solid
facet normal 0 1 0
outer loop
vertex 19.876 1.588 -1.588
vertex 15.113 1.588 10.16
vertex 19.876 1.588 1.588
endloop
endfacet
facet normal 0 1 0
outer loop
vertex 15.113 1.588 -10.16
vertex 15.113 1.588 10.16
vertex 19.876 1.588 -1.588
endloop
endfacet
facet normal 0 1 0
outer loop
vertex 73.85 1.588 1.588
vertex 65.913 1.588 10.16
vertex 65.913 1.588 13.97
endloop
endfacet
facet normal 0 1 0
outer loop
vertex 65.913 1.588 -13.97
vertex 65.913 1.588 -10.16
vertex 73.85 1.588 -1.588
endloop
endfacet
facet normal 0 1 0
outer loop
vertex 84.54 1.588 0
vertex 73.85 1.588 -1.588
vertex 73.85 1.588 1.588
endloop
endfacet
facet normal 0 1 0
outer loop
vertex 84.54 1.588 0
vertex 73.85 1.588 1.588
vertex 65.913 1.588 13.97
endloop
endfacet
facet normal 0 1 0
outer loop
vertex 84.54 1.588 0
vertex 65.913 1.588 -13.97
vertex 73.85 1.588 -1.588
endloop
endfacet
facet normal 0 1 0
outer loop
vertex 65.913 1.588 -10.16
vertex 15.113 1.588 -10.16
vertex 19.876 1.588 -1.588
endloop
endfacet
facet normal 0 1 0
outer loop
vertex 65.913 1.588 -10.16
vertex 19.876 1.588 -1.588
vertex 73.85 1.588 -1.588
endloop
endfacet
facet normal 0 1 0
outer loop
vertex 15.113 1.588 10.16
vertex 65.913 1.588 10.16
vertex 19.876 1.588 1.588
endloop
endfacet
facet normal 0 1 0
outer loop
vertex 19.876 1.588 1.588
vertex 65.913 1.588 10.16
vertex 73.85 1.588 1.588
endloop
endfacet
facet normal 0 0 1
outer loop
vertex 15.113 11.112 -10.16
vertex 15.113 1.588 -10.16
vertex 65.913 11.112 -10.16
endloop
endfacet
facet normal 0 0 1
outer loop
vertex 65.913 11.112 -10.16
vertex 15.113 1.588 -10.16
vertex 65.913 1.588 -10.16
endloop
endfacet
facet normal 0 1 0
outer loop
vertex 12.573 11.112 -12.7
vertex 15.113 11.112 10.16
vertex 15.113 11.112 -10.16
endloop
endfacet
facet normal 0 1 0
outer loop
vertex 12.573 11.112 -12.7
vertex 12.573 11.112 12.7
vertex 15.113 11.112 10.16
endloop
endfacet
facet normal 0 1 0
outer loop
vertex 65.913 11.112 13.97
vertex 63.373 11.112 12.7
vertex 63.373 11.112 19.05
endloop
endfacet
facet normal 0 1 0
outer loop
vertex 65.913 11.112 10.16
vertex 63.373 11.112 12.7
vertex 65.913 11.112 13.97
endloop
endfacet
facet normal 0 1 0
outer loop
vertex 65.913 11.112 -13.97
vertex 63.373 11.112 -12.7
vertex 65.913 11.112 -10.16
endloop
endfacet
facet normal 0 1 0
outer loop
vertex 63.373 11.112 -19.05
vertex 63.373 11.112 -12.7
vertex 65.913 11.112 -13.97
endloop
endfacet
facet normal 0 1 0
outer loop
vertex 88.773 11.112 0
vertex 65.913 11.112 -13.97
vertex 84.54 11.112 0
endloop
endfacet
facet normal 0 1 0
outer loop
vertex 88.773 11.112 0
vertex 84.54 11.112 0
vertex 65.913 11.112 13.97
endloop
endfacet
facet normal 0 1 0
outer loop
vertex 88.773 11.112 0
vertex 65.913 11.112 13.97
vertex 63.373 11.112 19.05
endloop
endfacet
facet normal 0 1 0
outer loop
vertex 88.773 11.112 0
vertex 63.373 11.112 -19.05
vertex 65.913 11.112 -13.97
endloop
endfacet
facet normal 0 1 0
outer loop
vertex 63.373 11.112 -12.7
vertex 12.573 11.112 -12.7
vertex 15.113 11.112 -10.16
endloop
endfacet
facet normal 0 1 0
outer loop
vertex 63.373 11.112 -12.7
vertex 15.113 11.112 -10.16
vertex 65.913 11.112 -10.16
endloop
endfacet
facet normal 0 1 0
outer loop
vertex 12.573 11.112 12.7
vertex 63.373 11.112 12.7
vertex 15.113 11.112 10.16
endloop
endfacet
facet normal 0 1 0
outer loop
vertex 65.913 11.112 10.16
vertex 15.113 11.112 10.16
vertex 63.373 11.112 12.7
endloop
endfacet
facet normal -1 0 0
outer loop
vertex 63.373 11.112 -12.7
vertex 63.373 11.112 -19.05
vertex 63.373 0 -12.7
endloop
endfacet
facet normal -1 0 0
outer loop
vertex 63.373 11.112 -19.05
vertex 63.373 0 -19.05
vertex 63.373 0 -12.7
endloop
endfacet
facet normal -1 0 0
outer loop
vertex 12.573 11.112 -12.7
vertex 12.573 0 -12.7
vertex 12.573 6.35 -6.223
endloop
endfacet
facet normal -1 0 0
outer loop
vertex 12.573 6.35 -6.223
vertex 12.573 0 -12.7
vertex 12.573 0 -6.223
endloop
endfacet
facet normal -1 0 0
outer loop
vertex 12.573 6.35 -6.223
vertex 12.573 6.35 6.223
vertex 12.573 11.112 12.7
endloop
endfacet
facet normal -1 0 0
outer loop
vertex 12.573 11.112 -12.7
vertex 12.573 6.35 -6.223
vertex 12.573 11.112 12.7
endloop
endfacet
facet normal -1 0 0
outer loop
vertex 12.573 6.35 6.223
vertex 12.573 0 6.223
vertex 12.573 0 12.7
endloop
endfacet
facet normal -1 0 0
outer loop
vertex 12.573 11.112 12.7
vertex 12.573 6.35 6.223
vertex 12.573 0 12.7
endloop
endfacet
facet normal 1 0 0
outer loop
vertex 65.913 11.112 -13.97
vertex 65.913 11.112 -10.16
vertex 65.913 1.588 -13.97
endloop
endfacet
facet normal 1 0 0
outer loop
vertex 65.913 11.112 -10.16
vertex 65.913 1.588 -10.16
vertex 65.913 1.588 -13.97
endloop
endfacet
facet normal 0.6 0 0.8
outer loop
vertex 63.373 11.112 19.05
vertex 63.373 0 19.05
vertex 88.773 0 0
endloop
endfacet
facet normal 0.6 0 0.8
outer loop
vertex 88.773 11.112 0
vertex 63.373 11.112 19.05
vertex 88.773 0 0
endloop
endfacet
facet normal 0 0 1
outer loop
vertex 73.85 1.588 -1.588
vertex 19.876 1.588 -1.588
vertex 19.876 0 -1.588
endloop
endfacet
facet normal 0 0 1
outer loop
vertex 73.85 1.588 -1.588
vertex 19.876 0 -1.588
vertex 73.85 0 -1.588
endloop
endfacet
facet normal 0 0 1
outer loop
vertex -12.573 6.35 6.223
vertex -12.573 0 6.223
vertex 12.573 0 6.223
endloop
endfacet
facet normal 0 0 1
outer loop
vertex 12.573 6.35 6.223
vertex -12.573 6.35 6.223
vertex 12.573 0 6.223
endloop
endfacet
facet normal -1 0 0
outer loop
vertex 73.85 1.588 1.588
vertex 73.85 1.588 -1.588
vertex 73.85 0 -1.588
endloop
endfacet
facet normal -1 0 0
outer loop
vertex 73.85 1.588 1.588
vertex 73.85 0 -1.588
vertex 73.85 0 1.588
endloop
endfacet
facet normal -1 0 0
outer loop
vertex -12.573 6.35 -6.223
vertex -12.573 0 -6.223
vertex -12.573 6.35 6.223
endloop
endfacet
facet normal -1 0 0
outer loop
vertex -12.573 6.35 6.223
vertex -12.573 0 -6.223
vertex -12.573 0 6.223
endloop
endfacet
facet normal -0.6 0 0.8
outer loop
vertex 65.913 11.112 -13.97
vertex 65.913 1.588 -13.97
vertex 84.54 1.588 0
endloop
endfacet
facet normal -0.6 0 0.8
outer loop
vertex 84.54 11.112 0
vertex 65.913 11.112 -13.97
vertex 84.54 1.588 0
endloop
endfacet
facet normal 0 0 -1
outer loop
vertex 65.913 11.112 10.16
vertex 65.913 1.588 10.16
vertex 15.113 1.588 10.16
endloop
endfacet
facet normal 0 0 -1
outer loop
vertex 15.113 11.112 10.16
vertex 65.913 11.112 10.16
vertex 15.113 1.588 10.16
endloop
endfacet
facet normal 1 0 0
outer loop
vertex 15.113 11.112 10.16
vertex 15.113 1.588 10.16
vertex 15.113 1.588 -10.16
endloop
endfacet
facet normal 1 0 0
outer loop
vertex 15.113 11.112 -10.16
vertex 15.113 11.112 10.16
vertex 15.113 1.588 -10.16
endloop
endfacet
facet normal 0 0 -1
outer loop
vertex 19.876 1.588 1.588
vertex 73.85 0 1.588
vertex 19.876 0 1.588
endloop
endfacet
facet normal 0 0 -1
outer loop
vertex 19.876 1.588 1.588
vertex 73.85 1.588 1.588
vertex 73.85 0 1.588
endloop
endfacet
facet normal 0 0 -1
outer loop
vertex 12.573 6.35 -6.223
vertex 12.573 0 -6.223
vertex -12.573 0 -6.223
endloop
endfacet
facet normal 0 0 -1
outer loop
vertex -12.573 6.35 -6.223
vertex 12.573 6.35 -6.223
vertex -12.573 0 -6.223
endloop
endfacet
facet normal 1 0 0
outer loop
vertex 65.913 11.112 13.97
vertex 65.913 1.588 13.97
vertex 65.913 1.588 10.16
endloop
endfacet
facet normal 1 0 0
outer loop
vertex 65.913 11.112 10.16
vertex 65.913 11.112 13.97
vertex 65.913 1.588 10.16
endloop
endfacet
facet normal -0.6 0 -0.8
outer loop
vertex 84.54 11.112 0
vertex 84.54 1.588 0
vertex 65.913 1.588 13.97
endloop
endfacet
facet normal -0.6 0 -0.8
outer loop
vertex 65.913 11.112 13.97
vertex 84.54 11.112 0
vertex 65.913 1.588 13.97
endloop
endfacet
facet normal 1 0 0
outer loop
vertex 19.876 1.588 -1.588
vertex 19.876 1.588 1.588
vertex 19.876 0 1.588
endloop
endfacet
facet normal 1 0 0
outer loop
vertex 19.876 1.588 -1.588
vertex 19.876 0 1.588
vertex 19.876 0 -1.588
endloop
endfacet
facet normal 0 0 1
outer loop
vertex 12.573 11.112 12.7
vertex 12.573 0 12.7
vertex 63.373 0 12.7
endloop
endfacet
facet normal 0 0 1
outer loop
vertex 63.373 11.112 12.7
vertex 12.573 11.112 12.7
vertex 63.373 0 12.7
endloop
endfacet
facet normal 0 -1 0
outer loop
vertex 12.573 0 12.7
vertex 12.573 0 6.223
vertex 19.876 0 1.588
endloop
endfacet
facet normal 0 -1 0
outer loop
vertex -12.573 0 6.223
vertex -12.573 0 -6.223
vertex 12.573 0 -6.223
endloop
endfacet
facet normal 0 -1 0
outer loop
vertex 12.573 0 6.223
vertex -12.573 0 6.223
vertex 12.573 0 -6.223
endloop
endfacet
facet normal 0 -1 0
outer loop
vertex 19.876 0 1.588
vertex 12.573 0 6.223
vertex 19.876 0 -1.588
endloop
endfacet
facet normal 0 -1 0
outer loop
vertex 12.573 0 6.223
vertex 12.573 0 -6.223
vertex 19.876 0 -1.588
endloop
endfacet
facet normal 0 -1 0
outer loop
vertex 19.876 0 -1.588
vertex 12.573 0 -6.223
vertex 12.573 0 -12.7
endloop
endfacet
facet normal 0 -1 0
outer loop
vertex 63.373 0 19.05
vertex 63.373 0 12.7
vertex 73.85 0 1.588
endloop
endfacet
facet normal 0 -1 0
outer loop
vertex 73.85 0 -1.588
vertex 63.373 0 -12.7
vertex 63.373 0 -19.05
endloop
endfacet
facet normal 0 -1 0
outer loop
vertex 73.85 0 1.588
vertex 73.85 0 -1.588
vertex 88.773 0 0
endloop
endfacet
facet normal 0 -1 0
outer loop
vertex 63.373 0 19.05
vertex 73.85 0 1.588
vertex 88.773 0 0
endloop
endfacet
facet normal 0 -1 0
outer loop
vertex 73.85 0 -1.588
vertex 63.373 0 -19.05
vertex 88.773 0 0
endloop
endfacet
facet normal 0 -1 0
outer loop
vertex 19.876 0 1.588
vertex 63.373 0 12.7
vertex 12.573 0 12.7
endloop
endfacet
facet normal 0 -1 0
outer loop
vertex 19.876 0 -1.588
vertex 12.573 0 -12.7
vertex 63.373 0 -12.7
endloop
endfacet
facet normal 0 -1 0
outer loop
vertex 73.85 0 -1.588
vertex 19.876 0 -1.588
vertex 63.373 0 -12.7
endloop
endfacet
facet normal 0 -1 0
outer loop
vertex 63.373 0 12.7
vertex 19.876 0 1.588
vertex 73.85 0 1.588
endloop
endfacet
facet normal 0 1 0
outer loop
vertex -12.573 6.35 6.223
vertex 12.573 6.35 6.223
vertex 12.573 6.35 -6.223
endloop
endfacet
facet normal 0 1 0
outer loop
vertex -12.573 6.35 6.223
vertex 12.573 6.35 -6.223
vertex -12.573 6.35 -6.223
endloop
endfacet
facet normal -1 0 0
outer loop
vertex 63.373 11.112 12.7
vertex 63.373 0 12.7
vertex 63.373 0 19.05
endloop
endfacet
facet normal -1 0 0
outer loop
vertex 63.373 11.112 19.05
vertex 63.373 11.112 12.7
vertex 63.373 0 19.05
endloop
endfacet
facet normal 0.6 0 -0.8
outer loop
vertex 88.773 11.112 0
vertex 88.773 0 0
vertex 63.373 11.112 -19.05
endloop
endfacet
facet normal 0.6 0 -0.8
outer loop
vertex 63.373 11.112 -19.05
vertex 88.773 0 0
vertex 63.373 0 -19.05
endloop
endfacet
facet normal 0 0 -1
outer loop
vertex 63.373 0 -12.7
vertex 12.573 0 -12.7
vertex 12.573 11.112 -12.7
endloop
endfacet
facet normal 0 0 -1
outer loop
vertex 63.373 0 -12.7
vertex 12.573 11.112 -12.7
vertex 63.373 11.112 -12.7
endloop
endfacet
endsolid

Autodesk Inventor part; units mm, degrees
ref_plane "YZ Plane" through (0, 0, 0) normal (1, 0, 0) x (0, 1, 0)
ref_plane "XZ Plane" through (0, 0, 0) normal (0, 1, 0) x (-1, 0, 0)
ref_plane "XY Plane" through (0, 0, 0) normal (0, 0, 1) x (1, 0, 0)
sketch "Sketch1" plane through (0, 0, 0) normal (0, 1, 0) x (-1, 0, 0)
  line L0 (12.573, 6.223) -> (-12.573, 6.223)
  line L1 (-12.573, 6.223) -> (-12.573, -6.223)
  line L2 (-12.573, -6.223) -> (12.573, -6.223)
  line L3 (12.573, -6.223) -> (12.573, 6.223)
  point P0 (0, 0)
  dimension "d0" = 12.446
  dimension "d1" = 25.146
  dimension "d2" = 6.223
  dimension "d3" = 12.573
extrude "Extrusion1" add sketch "Sketch1" along normal blind 6.35
sketch "Sketch2" plane through (12.573, 0, 6.223) normal (1, 0, 0) x (0, 0, -1)
  line L0 (-6.477, 0) -> (18.923, 0)
  line L1 (18.923, 0) -> (18.923, 1.5875)
  line L2 (18.923, 1.5875) -> (-6.477, 1.5875)
  line L3 (-6.477, 1.5875) -> (-6.477, 0)
  line L4 (0, 0) -> (12.446, 0) projected
  line L5 (0, 0) -> (12.446, 0) projected
  line L6 (12.446, 0) -> (12.446, 6.35) projected
  line L7 (0, 6.35) -> (12.446, 6.35) projected
  line L8 (0, 0) -> (0, 6.35) projected
  point P0 (6.223, 0)
  point P1 (6.223, 0)
  dimension "d6" = 25.4
  dimension "d7" = 12.7
  dimension "d8" = 1.5875
extrude "Extrusion2" add sketch "Sketch2" along normal blind 50.8 contours L3 L2 L8 L0 | L8 L2 L6 L0 | L6 L2 L1 L0
sketch "Sketch3" plane through (12.573, 1.5875, -6.223) normal (0, 1, 0) x (1, 0, 0)
  line L0 (0, 6.477) -> (0, 0) projected
  line L1 (0, -12.446) -> (0, 0) projected
  line L2 (0, -12.446) -> (0, -18.923) projected
  line L3 (0, -18.923) -> (50.8, -18.923) projected
  line L4 (50.8, 6.477) -> (50.8, -18.923) projected
  line L5 (0, 6.477) -> (50.8, 6.477) projected
  line L6 (50.8, -25.273) -> (50.8, 12.827)
  line L7 (50.8, 12.827) -> (76.2, -6.223)
  line L8 (76.2, -6.223) -> (50.8, -25.273)
  point P0 (-12.573, -6.223)
  point P1 (50.8, -18.923)
  dimension "d11" = 38.1
  dimension "d12" = 6.35
  dimension "d13" = 12.7
  dimension "d14" = 12.7
  dimension "d15" = 25.4
  dimension "d16" = 50.8
  dimension "d17" = 50.8
extrude "Extrusion3" add sketch "Sketch3" against normal blind 1.5875 contours L6 L7 L8 L4
sketch "Sketch4" plane through (12.573, 1.5875, -6.223) normal (0, 1, 0) x (1, 0, 0)
  line L0 (0, 6.477) -> (0, 0) projected
  line L1 (0, -12.446) -> (0, 0) projected
  line L2 (0, -12.446) -> (0, -18.923) projected
  line L3 (0, -18.923) -> (50.8, -18.923) projected
  line L4 (50.8, -18.923) -> (50.8, -25.273) projected
  line L5 (50.8, -25.273) -> (76.2, -6.223) projected
  line L6 (76.2, -6.223) -> (50.8, 12.827) projected
  line L7 (50.8, 12.827) -> (50.8, 6.477) projected
  line L8 (0, 6.477) -> (50.8, 6.477) projected
  line L9 (53.34, 3.937) -> (53.34, 7.747)
  line L10 (53.34, 7.747) -> (71.9667, -6.223)
  line L11 (71.9667, -6.223) -> (53.34, -20.193)
  line L12 (53.34, -20.193) -> (53.34, -16.383)
  line L13 (53.34, -16.383) -> (2.54, -16.383)
  line L14 (2.54, -16.383) -> (2.54, -12.446)
  line L15 (2.54, -12.446) -> (2.54, 0)
  line L16 (2.54, 0) -> (2.54, 3.937)
  line L17 (2.54, 3.937) -> (53.34, 3.937)
  point P0 (-12.573, -6.223)
  dimension "d20" = 2.54
extrude "Extrusion4" add sketch "Sketch4" along normal blind 9.525
sketch "Sketch6" plane through (15.113, 1.5875, -10.16) normal (0, 1, 0) x (1, 0, 0)
  line L0 (4.7625, -8.5725) -> (58.7375, -8.5725)
  line L1 (58.7375, -8.5725) -> (58.7375, -11.7475)
  line L2 (58.7375, -11.7475) -> (4.7625, -11.7475)
  line L3 (4.7625, -11.7475) -> (4.7625, -8.5725)
  line L4 (-27.686, -3.937) -> (-27.686, -16.383) projected
  point P0 (-15.113, -10.16)
  point P1 (-27.686, -10.16)
  dimension "d23" = 3.175
  dimension "d24" = 1.5875
extrude "Extrusion5" cut sketch "Sketch6" against normal blind 9.525
equation "\"d2\" = 0.5 * d0"
equation "\"d3\" = 0.5 * d1"
equation "\"d7\" = 0.5 * d6"
equation "\"d17\" = d16"
equation "\"d24\" = 0.5 * d23"
properties part number "Part_5_ledholder"
